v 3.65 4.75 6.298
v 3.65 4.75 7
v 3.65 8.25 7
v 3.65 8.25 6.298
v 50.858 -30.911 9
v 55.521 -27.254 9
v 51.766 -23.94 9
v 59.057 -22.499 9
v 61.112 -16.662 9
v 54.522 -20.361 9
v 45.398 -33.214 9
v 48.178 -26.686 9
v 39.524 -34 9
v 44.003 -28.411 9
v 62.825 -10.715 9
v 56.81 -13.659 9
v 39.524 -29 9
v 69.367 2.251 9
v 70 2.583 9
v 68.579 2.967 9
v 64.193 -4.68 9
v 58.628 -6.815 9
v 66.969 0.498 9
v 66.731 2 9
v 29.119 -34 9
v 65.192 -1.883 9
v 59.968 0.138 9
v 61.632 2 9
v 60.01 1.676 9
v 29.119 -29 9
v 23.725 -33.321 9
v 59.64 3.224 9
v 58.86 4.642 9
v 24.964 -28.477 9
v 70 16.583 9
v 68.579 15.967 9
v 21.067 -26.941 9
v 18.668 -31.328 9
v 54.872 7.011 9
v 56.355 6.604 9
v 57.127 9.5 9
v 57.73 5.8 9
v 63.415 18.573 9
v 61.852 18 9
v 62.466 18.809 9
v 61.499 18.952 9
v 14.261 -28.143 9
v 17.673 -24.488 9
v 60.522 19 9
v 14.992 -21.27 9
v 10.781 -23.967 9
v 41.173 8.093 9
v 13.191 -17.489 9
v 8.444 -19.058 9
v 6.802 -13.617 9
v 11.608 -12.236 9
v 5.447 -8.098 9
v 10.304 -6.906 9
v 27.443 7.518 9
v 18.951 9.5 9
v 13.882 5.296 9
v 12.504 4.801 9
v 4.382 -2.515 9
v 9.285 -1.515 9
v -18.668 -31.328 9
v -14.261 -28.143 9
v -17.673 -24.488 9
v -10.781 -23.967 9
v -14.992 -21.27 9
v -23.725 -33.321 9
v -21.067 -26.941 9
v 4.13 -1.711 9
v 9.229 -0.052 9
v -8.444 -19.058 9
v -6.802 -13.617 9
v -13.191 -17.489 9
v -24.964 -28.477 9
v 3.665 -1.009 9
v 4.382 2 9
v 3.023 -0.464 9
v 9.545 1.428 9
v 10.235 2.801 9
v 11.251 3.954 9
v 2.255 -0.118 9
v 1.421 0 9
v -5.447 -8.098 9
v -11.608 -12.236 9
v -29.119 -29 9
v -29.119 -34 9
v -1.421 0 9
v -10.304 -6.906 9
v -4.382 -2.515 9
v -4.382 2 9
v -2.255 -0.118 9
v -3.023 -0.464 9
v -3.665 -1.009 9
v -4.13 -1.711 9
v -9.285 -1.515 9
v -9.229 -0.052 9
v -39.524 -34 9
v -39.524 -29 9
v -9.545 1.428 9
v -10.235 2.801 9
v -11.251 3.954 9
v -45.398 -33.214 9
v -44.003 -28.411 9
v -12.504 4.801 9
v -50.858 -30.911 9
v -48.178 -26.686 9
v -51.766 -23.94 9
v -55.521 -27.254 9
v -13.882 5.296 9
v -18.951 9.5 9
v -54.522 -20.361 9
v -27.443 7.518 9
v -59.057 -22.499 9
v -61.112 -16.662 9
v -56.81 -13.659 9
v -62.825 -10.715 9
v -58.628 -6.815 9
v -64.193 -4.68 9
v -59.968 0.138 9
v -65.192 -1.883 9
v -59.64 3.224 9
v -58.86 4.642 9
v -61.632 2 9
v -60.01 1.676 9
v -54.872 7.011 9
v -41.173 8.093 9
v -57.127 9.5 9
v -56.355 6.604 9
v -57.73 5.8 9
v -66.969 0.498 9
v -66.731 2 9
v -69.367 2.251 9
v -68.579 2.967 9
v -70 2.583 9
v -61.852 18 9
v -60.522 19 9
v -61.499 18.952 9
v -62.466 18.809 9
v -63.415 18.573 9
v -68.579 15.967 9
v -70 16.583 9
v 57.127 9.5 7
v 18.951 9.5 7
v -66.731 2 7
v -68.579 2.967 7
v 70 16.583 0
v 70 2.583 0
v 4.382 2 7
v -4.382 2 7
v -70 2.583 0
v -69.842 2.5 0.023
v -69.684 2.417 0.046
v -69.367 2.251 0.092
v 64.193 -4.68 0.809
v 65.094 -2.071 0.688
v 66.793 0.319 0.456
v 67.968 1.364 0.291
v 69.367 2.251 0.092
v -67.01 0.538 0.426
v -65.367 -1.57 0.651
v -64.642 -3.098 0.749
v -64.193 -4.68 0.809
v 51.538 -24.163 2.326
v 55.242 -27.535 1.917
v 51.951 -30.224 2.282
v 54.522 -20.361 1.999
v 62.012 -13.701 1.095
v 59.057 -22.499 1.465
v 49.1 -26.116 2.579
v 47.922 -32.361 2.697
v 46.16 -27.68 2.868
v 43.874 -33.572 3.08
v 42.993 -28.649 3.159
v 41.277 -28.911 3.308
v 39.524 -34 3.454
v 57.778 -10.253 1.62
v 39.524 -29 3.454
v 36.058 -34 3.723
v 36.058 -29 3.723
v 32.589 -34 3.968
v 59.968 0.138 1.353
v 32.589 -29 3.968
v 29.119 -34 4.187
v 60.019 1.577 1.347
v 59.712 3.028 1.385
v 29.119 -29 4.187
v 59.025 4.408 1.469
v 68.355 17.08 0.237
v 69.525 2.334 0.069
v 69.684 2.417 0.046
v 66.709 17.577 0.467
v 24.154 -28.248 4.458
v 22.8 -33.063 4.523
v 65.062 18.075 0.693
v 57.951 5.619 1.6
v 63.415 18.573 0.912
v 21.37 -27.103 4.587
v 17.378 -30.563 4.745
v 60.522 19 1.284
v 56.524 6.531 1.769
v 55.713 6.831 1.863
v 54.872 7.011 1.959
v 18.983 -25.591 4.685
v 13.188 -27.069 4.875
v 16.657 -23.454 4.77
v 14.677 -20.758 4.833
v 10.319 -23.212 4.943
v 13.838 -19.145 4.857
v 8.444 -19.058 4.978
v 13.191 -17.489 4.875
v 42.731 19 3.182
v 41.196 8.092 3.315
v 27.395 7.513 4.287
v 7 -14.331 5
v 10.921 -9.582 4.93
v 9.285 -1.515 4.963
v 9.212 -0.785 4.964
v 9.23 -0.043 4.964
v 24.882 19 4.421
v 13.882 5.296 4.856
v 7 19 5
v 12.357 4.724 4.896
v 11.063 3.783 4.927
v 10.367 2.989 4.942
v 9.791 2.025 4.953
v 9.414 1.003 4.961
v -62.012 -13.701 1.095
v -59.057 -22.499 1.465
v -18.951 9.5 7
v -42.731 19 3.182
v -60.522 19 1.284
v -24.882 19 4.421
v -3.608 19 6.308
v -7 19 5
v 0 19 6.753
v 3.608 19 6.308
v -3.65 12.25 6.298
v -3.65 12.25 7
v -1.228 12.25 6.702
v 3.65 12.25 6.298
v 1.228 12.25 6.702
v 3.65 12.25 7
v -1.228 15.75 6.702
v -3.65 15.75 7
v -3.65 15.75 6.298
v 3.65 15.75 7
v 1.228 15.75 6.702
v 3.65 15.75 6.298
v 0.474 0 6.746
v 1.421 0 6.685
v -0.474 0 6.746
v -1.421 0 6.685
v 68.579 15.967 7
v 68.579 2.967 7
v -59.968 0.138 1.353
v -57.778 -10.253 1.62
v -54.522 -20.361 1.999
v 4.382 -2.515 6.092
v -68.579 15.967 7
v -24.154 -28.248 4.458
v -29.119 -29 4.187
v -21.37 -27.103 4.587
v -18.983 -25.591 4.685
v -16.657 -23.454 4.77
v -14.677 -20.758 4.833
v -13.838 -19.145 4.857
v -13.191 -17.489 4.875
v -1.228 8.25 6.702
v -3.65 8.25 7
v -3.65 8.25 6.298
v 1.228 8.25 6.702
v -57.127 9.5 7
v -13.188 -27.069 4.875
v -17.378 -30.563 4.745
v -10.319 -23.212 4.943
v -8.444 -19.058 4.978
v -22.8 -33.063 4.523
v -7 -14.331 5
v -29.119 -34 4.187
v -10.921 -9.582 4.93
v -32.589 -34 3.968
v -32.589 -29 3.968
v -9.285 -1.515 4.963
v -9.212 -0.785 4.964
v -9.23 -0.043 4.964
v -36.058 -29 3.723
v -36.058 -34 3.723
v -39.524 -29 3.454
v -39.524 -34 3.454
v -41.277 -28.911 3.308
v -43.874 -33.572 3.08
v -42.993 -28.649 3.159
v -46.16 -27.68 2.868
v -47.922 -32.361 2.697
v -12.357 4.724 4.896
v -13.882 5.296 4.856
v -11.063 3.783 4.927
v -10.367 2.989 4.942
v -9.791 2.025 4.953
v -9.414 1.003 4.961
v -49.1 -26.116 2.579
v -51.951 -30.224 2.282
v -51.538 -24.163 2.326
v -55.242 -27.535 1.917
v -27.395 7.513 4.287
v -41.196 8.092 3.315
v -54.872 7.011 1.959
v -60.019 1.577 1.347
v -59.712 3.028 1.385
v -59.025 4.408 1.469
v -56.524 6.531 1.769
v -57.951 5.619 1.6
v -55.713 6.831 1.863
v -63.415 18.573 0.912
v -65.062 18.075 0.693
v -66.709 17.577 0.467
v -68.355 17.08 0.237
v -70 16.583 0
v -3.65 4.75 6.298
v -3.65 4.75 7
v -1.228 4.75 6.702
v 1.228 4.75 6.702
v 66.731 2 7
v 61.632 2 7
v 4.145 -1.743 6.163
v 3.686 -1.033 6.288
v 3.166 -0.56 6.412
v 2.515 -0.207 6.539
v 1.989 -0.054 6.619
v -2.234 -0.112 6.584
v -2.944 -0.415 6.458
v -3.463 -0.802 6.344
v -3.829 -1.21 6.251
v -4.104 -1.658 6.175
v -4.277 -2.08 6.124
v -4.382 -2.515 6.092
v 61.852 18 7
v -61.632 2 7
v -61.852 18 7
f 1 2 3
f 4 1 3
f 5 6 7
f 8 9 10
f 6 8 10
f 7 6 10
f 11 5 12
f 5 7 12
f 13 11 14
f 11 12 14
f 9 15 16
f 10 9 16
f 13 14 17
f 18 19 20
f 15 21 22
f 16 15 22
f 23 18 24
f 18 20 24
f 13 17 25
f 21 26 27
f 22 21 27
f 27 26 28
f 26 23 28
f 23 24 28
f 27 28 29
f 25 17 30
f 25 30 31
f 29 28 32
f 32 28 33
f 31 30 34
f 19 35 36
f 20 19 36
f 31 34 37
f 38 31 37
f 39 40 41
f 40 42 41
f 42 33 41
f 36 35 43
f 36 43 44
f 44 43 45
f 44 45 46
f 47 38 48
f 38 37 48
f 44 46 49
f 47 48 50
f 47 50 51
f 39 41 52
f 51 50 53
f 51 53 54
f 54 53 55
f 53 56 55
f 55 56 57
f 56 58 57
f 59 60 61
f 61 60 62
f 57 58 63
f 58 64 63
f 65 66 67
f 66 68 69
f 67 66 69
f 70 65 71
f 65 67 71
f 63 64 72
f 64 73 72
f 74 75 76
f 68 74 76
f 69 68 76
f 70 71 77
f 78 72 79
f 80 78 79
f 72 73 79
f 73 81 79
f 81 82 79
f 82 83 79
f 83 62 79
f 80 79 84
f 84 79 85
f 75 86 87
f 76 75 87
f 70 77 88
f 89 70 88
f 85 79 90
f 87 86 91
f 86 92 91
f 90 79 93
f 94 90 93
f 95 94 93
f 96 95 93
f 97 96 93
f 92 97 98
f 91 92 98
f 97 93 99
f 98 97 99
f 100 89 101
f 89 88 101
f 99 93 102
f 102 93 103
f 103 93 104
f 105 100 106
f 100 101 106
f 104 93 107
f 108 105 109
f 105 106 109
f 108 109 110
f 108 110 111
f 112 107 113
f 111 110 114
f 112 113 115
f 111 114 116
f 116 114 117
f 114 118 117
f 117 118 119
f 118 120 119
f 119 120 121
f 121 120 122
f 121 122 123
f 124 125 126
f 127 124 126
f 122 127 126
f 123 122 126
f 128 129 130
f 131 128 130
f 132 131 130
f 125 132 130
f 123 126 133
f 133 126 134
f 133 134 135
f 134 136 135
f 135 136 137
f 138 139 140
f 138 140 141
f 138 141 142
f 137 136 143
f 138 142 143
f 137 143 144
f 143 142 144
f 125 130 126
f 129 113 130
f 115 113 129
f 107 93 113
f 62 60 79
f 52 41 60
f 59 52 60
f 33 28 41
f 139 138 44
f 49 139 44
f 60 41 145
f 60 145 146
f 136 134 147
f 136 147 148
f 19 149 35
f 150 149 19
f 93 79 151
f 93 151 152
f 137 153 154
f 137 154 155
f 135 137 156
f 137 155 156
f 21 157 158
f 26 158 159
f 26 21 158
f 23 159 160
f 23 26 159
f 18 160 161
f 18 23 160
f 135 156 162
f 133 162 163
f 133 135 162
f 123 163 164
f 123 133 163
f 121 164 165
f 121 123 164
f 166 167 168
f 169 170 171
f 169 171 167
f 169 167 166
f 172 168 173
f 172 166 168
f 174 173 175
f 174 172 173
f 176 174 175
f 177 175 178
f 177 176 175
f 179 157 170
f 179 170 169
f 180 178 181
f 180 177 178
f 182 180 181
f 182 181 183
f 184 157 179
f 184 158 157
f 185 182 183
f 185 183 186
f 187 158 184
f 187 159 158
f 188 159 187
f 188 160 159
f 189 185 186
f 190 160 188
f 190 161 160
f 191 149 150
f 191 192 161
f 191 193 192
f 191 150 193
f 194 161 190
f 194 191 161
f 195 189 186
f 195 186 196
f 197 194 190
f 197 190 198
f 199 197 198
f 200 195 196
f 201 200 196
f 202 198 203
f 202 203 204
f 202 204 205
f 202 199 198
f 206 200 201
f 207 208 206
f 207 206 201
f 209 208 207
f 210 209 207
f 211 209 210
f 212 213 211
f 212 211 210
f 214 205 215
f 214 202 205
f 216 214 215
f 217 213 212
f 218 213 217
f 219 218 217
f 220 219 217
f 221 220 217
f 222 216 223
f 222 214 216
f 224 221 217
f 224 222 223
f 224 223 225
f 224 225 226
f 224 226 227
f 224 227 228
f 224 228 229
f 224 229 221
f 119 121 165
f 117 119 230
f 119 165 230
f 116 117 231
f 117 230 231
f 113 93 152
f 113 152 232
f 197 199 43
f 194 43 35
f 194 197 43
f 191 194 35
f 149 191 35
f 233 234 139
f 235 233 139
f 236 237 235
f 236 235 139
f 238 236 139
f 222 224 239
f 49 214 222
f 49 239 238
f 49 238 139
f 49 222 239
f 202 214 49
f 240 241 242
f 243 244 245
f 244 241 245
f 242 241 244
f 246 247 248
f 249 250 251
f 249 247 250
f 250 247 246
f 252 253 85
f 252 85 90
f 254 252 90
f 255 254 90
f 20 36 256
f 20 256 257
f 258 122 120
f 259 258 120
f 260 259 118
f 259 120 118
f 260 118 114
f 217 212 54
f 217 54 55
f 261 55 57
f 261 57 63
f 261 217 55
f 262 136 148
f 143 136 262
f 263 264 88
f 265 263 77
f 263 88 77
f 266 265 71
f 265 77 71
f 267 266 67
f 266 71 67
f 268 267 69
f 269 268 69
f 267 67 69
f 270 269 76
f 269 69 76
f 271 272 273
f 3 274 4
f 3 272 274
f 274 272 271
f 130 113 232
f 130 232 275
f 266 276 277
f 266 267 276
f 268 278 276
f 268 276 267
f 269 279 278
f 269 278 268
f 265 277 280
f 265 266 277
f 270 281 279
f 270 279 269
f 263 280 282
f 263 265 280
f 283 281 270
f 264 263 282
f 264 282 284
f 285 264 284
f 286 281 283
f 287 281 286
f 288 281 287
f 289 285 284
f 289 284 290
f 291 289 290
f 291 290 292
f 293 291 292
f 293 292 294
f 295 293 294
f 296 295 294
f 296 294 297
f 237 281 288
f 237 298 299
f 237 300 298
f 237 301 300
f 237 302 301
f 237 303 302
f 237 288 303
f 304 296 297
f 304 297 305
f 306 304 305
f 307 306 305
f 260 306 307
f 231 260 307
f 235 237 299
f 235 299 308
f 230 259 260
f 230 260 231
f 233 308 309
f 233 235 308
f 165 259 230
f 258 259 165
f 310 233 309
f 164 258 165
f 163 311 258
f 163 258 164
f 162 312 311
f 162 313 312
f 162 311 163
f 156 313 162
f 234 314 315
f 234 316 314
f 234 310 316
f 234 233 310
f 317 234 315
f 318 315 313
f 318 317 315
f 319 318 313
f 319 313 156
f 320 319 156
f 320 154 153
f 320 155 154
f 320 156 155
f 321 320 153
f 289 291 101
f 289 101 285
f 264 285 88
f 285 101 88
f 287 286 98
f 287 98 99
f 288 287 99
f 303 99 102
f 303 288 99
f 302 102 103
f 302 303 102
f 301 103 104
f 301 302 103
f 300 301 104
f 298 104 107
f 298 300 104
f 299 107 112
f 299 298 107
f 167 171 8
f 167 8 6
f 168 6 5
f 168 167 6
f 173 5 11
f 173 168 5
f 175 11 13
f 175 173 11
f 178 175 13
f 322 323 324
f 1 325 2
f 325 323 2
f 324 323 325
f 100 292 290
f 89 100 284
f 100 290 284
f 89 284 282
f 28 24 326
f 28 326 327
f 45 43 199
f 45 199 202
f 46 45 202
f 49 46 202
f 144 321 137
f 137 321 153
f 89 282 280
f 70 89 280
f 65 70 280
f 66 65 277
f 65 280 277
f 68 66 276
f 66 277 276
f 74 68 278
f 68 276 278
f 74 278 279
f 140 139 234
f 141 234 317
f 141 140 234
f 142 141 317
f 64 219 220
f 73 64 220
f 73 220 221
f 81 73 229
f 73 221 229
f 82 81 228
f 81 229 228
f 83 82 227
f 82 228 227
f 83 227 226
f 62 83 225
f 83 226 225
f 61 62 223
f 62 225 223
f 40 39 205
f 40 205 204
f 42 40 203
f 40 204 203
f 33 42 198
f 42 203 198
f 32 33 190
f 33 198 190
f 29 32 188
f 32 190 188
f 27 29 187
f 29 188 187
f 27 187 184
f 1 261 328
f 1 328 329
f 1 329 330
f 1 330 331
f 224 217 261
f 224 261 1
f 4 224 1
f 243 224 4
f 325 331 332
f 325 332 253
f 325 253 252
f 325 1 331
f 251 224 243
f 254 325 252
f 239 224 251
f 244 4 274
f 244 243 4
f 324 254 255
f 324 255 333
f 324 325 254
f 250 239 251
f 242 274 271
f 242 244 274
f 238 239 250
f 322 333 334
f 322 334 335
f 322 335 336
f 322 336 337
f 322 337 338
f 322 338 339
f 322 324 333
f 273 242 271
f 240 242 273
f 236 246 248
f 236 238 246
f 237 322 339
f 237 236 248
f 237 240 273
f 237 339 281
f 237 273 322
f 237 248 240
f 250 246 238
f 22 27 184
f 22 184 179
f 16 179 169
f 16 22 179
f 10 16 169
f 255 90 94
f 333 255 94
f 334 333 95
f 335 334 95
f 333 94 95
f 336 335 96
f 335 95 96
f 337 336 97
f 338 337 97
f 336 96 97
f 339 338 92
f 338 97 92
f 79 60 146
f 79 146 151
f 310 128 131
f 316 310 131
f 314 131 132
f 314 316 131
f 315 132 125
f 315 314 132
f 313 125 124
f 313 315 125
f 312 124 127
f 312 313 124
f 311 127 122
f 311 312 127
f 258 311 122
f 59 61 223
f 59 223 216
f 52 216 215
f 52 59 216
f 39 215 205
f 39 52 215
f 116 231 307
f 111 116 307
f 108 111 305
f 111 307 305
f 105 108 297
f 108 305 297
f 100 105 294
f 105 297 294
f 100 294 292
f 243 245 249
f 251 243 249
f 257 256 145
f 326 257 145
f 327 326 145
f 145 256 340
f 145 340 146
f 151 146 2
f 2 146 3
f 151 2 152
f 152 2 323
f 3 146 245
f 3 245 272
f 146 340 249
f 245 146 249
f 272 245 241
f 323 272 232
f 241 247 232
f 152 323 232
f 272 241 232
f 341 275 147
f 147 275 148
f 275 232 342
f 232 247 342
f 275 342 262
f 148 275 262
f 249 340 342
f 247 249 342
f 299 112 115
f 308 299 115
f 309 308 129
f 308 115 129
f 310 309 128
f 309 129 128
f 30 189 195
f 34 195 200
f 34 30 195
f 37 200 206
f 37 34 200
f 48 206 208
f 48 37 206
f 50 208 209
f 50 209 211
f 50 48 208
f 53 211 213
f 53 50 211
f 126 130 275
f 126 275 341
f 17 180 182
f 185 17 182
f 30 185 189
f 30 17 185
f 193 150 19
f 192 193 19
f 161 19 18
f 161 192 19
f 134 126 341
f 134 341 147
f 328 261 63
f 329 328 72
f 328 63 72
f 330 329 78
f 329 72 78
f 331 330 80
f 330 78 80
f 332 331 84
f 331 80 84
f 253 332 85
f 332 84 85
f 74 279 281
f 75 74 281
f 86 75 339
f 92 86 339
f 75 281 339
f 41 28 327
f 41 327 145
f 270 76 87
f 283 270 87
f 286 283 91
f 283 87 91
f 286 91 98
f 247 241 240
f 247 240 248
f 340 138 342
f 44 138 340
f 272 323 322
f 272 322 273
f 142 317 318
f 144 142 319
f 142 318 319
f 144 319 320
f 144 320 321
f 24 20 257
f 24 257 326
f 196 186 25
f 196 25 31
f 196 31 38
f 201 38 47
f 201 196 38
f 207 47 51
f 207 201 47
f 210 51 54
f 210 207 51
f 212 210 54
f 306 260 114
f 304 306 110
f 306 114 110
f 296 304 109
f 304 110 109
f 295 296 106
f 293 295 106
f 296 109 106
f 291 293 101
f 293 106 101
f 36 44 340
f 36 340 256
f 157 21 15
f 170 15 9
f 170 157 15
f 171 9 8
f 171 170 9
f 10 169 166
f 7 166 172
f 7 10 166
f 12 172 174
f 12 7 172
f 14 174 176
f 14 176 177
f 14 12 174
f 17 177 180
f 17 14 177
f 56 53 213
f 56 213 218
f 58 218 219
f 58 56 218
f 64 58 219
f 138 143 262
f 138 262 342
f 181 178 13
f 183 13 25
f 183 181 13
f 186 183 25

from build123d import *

# Parameters (mm, degrees)
BOSS_EXTRUDE1_DEPTH  = 9
CUT_EXTRUDE1_DEPTH   = 79.339006887
FILLET1_R            = 6
FILLET4_R            = 3
FILLET5_R            = 10
FILLET1_OF_MIRROR2_R = 6
FILLET4_OF_MIRROR2_R = 3
FILLET5_OF_MIRROR2_R = 10
CUT_EXTRUDE2_DEPTH   = 2
SKETCH4_W            = 7.3
SKETCH4_H            = 3.5
CUT_EXTRUDE3_DEPTH   = 79.134499565
CUT_EXTRUDE4_DEPTH   = 89.260976804


with BuildPart() as part:
    # Sketch1 → Boss-Extrude1 (new body)
    with BuildSketch(Plane.XY):
        with BuildLine():
            Line((-70, 16.58258549), (-70, 2.58258549))
            Line((-70, 2.58258549), (-65, -0.035347018))
            ThreePointArc((-65, -0.035347018), (-62.639321295, -11.428715409), (-59.057390955, -22.499009997))
            ThreePointArc((-59.057390955, -22.499009997), (-50.858075368, -30.911196539), (-39.524366721, -34))
            Line((-39.524366721, -34), (-29.119439011, -34))
            ThreePointArc((-29.119439011, -34), (-16.364659062, -29.873537236), (-8.443933007, -19.058075838))
            ThreePointArc((-8.443933007, -19.058075838), (-5.792248942, -9.629238804), (-4, 0))
            Line((-4, 0), (0, 0))
            Line((0, 0), (0, 19))
            Line((0, 19), (-62, 19))
            Line((-62, 19), (-70, 16.58258549))
        make_face()
    boss_extrude1 = extrude(amount=BOSS_EXTRUDE1_DEPTH)

    # Sketch2 → Cut-Extrude1 (cut, through all)
    with BuildSketch(Plane.XY.offset(9)):
        with BuildLine():
            Line((-39.524366721, -29), (-29.119439011, -29))
            ThreePointArc((-29.119439011, -29), (-19.293350153, -25.821035725), (-13.191343035, -17.488968441))
            ThreePointArc((-13.191343035, -17.488968441), (-10.661621804, -8.493805879), (-8.951806424, 0.692541077))
            ThreePointArc((-8.951806424, 0.692541077), (-8.83111114, 2.375291538), (-8.93749946, 4.05900707))
            ThreePointArc((-8.93749946, 4.05900707), (-33.987475013, 7.999161751), (-59.288689209, 6.303681198))
            ThreePointArc((-59.288689209, 6.303681198), (-60.075532666, 3.563074376), (-60.056140486, 0.711816353))
            ThreePointArc((-60.056140486, 0.711816353), (-57.852345066, -9.972645379), (-54.521869403, -20.361214511))
            ThreePointArc((-54.521869403, -20.361214511), (-48.178176596, -26.685865227), (-39.524366721, -29))
        make_face()
    cut_extrude1 = extrude(amount=-CUT_EXTRUDE1_DEPTH, mode=Mode.SUBTRACT)

    # Fillet1
    fillet1_edges = [part.edges().sort_by_distance(p)[0] for p in [
        (-8.93749946, 4.05900707, 4.5),
        (-59.288689209, 6.303681198, 4.5),
    ]]
    fillet(fillet1_edges, radius=FILLET1_R)

    # Fillet4
    fillet4_edges = [part.edges().sort_by_distance(p)[0] for p in [
        (-4, 0, 4.5),
    ]]
    fillet(fillet4_edges, radius=FILLET4_R)

    # Fillet5
    fillet5_edges = [part.edges().sort_by_distance(p)[0] for p in [
        (-65, -0.035347018, 4.5),
        (-62, 19, 4.5),
    ]]
    fillet(fillet5_edges, radius=FILLET5_R)

    # Mirror2: Boss-Extrude1, Cut-Extrude1 across plane
    add(boss_extrude1.mirror(Plane(origin=(0, 19, 9), x_dir=(0, 0, 1), z_dir=(1, 0, 0))))
    add(cut_extrude1.mirror(Plane(origin=(0, 19, 9), x_dir=(0, 0, 1), z_dir=(1, 0, 0))), mode=Mode.SUBTRACT)

    # Fillet1 of Mirror2
    fillet1_of_mirror2_edges = [part.edges().sort_by_distance(p)[0] for p in [
        (8.93749946, 4.05900707, 4.5),
        (59.288689209, 6.303681198, 4.5),
    ]]
    fillet(fillet1_of_mirror2_edges, radius=FILLET1_OF_MIRROR2_R)

    # Fillet4 of Mirror2
    fillet4_of_mirror2_edges = [part.edges().sort_by_distance(p)[0] for p in [
        (4, 0, 4.5),
    ]]
    fillet(fillet4_of_mirror2_edges, radius=FILLET4_OF_MIRROR2_R)

    # Fillet5 of Mirror2
    fillet5_of_mirror2_edges = [part.edges().sort_by_distance(p)[0] for p in [
        (65, -0.035347018, 4.5),
        (62, 19, 4.5),
    ]]
    fillet(fillet5_of_mirror2_edges, radius=FILLET5_OF_MIRROR2_R)

    # Sketch3 → Cut-Extrude2 (cut)
    with BuildSketch(Plane.XY.offset(9)):
        Polygon((-68.579000582, 15.967320332), (-61.852211578, 18), (61.852211578, 18), (68.579000582, 15.967320332), (68.579000582, 2.967348727), (66.731457293, 2), (61.632252323, 2), (57.126911514, 9.5), (18.95111491, 9.5), (4.382114171, 2), (-4.382114171, 2), (-18.95111491, 9.5), (-57.126911514, 9.5), (-61.632252323, 2), (-66.731457293, 2), (-68.579000582, 2.967348727), align=None)
    extrude(amount=-CUT_EXTRUDE2_DEPTH, mode=Mode.SUBTRACT)

    # Sketch4 → Cut-Extrude3 (cut, through all)
    with BuildSketch(Plane.XY.offset(7)):
        with Locations((0, 14)):
            Rectangle(SKETCH4_W, SKETCH4_H)
        with Locations((0, 6.5)):
            Rectangle(SKETCH4_W, SKETCH4_H)
    extrude(amount=-CUT_EXTRUDE3_DEPTH, mode=Mode.SUBTRACT)

    # Sketch5 → Cut-Extrude4 (cut, through all)
    with BuildSketch(Plane(origin=(0, 19, 0), x_dir=(1, 0, 0), z_dir=(0, 1, 0))):
        with BuildLine():
            Line((-70, 0), (70, 0))
            ThreePointArc((70, 0), (38.581705318, -3.529487002), (7, -5))
            ThreePointArc((7, -5), (0, -6.753122833), (-7, -5))
            ThreePointArc((-7, -5), (-38.581705318, -3.529487002), (-70, 0))
        make_face()
    extrude(amount=-CUT_EXTRUDE4_DEPTH, mode=Mode.SUBTRACT)


solid = part.part
